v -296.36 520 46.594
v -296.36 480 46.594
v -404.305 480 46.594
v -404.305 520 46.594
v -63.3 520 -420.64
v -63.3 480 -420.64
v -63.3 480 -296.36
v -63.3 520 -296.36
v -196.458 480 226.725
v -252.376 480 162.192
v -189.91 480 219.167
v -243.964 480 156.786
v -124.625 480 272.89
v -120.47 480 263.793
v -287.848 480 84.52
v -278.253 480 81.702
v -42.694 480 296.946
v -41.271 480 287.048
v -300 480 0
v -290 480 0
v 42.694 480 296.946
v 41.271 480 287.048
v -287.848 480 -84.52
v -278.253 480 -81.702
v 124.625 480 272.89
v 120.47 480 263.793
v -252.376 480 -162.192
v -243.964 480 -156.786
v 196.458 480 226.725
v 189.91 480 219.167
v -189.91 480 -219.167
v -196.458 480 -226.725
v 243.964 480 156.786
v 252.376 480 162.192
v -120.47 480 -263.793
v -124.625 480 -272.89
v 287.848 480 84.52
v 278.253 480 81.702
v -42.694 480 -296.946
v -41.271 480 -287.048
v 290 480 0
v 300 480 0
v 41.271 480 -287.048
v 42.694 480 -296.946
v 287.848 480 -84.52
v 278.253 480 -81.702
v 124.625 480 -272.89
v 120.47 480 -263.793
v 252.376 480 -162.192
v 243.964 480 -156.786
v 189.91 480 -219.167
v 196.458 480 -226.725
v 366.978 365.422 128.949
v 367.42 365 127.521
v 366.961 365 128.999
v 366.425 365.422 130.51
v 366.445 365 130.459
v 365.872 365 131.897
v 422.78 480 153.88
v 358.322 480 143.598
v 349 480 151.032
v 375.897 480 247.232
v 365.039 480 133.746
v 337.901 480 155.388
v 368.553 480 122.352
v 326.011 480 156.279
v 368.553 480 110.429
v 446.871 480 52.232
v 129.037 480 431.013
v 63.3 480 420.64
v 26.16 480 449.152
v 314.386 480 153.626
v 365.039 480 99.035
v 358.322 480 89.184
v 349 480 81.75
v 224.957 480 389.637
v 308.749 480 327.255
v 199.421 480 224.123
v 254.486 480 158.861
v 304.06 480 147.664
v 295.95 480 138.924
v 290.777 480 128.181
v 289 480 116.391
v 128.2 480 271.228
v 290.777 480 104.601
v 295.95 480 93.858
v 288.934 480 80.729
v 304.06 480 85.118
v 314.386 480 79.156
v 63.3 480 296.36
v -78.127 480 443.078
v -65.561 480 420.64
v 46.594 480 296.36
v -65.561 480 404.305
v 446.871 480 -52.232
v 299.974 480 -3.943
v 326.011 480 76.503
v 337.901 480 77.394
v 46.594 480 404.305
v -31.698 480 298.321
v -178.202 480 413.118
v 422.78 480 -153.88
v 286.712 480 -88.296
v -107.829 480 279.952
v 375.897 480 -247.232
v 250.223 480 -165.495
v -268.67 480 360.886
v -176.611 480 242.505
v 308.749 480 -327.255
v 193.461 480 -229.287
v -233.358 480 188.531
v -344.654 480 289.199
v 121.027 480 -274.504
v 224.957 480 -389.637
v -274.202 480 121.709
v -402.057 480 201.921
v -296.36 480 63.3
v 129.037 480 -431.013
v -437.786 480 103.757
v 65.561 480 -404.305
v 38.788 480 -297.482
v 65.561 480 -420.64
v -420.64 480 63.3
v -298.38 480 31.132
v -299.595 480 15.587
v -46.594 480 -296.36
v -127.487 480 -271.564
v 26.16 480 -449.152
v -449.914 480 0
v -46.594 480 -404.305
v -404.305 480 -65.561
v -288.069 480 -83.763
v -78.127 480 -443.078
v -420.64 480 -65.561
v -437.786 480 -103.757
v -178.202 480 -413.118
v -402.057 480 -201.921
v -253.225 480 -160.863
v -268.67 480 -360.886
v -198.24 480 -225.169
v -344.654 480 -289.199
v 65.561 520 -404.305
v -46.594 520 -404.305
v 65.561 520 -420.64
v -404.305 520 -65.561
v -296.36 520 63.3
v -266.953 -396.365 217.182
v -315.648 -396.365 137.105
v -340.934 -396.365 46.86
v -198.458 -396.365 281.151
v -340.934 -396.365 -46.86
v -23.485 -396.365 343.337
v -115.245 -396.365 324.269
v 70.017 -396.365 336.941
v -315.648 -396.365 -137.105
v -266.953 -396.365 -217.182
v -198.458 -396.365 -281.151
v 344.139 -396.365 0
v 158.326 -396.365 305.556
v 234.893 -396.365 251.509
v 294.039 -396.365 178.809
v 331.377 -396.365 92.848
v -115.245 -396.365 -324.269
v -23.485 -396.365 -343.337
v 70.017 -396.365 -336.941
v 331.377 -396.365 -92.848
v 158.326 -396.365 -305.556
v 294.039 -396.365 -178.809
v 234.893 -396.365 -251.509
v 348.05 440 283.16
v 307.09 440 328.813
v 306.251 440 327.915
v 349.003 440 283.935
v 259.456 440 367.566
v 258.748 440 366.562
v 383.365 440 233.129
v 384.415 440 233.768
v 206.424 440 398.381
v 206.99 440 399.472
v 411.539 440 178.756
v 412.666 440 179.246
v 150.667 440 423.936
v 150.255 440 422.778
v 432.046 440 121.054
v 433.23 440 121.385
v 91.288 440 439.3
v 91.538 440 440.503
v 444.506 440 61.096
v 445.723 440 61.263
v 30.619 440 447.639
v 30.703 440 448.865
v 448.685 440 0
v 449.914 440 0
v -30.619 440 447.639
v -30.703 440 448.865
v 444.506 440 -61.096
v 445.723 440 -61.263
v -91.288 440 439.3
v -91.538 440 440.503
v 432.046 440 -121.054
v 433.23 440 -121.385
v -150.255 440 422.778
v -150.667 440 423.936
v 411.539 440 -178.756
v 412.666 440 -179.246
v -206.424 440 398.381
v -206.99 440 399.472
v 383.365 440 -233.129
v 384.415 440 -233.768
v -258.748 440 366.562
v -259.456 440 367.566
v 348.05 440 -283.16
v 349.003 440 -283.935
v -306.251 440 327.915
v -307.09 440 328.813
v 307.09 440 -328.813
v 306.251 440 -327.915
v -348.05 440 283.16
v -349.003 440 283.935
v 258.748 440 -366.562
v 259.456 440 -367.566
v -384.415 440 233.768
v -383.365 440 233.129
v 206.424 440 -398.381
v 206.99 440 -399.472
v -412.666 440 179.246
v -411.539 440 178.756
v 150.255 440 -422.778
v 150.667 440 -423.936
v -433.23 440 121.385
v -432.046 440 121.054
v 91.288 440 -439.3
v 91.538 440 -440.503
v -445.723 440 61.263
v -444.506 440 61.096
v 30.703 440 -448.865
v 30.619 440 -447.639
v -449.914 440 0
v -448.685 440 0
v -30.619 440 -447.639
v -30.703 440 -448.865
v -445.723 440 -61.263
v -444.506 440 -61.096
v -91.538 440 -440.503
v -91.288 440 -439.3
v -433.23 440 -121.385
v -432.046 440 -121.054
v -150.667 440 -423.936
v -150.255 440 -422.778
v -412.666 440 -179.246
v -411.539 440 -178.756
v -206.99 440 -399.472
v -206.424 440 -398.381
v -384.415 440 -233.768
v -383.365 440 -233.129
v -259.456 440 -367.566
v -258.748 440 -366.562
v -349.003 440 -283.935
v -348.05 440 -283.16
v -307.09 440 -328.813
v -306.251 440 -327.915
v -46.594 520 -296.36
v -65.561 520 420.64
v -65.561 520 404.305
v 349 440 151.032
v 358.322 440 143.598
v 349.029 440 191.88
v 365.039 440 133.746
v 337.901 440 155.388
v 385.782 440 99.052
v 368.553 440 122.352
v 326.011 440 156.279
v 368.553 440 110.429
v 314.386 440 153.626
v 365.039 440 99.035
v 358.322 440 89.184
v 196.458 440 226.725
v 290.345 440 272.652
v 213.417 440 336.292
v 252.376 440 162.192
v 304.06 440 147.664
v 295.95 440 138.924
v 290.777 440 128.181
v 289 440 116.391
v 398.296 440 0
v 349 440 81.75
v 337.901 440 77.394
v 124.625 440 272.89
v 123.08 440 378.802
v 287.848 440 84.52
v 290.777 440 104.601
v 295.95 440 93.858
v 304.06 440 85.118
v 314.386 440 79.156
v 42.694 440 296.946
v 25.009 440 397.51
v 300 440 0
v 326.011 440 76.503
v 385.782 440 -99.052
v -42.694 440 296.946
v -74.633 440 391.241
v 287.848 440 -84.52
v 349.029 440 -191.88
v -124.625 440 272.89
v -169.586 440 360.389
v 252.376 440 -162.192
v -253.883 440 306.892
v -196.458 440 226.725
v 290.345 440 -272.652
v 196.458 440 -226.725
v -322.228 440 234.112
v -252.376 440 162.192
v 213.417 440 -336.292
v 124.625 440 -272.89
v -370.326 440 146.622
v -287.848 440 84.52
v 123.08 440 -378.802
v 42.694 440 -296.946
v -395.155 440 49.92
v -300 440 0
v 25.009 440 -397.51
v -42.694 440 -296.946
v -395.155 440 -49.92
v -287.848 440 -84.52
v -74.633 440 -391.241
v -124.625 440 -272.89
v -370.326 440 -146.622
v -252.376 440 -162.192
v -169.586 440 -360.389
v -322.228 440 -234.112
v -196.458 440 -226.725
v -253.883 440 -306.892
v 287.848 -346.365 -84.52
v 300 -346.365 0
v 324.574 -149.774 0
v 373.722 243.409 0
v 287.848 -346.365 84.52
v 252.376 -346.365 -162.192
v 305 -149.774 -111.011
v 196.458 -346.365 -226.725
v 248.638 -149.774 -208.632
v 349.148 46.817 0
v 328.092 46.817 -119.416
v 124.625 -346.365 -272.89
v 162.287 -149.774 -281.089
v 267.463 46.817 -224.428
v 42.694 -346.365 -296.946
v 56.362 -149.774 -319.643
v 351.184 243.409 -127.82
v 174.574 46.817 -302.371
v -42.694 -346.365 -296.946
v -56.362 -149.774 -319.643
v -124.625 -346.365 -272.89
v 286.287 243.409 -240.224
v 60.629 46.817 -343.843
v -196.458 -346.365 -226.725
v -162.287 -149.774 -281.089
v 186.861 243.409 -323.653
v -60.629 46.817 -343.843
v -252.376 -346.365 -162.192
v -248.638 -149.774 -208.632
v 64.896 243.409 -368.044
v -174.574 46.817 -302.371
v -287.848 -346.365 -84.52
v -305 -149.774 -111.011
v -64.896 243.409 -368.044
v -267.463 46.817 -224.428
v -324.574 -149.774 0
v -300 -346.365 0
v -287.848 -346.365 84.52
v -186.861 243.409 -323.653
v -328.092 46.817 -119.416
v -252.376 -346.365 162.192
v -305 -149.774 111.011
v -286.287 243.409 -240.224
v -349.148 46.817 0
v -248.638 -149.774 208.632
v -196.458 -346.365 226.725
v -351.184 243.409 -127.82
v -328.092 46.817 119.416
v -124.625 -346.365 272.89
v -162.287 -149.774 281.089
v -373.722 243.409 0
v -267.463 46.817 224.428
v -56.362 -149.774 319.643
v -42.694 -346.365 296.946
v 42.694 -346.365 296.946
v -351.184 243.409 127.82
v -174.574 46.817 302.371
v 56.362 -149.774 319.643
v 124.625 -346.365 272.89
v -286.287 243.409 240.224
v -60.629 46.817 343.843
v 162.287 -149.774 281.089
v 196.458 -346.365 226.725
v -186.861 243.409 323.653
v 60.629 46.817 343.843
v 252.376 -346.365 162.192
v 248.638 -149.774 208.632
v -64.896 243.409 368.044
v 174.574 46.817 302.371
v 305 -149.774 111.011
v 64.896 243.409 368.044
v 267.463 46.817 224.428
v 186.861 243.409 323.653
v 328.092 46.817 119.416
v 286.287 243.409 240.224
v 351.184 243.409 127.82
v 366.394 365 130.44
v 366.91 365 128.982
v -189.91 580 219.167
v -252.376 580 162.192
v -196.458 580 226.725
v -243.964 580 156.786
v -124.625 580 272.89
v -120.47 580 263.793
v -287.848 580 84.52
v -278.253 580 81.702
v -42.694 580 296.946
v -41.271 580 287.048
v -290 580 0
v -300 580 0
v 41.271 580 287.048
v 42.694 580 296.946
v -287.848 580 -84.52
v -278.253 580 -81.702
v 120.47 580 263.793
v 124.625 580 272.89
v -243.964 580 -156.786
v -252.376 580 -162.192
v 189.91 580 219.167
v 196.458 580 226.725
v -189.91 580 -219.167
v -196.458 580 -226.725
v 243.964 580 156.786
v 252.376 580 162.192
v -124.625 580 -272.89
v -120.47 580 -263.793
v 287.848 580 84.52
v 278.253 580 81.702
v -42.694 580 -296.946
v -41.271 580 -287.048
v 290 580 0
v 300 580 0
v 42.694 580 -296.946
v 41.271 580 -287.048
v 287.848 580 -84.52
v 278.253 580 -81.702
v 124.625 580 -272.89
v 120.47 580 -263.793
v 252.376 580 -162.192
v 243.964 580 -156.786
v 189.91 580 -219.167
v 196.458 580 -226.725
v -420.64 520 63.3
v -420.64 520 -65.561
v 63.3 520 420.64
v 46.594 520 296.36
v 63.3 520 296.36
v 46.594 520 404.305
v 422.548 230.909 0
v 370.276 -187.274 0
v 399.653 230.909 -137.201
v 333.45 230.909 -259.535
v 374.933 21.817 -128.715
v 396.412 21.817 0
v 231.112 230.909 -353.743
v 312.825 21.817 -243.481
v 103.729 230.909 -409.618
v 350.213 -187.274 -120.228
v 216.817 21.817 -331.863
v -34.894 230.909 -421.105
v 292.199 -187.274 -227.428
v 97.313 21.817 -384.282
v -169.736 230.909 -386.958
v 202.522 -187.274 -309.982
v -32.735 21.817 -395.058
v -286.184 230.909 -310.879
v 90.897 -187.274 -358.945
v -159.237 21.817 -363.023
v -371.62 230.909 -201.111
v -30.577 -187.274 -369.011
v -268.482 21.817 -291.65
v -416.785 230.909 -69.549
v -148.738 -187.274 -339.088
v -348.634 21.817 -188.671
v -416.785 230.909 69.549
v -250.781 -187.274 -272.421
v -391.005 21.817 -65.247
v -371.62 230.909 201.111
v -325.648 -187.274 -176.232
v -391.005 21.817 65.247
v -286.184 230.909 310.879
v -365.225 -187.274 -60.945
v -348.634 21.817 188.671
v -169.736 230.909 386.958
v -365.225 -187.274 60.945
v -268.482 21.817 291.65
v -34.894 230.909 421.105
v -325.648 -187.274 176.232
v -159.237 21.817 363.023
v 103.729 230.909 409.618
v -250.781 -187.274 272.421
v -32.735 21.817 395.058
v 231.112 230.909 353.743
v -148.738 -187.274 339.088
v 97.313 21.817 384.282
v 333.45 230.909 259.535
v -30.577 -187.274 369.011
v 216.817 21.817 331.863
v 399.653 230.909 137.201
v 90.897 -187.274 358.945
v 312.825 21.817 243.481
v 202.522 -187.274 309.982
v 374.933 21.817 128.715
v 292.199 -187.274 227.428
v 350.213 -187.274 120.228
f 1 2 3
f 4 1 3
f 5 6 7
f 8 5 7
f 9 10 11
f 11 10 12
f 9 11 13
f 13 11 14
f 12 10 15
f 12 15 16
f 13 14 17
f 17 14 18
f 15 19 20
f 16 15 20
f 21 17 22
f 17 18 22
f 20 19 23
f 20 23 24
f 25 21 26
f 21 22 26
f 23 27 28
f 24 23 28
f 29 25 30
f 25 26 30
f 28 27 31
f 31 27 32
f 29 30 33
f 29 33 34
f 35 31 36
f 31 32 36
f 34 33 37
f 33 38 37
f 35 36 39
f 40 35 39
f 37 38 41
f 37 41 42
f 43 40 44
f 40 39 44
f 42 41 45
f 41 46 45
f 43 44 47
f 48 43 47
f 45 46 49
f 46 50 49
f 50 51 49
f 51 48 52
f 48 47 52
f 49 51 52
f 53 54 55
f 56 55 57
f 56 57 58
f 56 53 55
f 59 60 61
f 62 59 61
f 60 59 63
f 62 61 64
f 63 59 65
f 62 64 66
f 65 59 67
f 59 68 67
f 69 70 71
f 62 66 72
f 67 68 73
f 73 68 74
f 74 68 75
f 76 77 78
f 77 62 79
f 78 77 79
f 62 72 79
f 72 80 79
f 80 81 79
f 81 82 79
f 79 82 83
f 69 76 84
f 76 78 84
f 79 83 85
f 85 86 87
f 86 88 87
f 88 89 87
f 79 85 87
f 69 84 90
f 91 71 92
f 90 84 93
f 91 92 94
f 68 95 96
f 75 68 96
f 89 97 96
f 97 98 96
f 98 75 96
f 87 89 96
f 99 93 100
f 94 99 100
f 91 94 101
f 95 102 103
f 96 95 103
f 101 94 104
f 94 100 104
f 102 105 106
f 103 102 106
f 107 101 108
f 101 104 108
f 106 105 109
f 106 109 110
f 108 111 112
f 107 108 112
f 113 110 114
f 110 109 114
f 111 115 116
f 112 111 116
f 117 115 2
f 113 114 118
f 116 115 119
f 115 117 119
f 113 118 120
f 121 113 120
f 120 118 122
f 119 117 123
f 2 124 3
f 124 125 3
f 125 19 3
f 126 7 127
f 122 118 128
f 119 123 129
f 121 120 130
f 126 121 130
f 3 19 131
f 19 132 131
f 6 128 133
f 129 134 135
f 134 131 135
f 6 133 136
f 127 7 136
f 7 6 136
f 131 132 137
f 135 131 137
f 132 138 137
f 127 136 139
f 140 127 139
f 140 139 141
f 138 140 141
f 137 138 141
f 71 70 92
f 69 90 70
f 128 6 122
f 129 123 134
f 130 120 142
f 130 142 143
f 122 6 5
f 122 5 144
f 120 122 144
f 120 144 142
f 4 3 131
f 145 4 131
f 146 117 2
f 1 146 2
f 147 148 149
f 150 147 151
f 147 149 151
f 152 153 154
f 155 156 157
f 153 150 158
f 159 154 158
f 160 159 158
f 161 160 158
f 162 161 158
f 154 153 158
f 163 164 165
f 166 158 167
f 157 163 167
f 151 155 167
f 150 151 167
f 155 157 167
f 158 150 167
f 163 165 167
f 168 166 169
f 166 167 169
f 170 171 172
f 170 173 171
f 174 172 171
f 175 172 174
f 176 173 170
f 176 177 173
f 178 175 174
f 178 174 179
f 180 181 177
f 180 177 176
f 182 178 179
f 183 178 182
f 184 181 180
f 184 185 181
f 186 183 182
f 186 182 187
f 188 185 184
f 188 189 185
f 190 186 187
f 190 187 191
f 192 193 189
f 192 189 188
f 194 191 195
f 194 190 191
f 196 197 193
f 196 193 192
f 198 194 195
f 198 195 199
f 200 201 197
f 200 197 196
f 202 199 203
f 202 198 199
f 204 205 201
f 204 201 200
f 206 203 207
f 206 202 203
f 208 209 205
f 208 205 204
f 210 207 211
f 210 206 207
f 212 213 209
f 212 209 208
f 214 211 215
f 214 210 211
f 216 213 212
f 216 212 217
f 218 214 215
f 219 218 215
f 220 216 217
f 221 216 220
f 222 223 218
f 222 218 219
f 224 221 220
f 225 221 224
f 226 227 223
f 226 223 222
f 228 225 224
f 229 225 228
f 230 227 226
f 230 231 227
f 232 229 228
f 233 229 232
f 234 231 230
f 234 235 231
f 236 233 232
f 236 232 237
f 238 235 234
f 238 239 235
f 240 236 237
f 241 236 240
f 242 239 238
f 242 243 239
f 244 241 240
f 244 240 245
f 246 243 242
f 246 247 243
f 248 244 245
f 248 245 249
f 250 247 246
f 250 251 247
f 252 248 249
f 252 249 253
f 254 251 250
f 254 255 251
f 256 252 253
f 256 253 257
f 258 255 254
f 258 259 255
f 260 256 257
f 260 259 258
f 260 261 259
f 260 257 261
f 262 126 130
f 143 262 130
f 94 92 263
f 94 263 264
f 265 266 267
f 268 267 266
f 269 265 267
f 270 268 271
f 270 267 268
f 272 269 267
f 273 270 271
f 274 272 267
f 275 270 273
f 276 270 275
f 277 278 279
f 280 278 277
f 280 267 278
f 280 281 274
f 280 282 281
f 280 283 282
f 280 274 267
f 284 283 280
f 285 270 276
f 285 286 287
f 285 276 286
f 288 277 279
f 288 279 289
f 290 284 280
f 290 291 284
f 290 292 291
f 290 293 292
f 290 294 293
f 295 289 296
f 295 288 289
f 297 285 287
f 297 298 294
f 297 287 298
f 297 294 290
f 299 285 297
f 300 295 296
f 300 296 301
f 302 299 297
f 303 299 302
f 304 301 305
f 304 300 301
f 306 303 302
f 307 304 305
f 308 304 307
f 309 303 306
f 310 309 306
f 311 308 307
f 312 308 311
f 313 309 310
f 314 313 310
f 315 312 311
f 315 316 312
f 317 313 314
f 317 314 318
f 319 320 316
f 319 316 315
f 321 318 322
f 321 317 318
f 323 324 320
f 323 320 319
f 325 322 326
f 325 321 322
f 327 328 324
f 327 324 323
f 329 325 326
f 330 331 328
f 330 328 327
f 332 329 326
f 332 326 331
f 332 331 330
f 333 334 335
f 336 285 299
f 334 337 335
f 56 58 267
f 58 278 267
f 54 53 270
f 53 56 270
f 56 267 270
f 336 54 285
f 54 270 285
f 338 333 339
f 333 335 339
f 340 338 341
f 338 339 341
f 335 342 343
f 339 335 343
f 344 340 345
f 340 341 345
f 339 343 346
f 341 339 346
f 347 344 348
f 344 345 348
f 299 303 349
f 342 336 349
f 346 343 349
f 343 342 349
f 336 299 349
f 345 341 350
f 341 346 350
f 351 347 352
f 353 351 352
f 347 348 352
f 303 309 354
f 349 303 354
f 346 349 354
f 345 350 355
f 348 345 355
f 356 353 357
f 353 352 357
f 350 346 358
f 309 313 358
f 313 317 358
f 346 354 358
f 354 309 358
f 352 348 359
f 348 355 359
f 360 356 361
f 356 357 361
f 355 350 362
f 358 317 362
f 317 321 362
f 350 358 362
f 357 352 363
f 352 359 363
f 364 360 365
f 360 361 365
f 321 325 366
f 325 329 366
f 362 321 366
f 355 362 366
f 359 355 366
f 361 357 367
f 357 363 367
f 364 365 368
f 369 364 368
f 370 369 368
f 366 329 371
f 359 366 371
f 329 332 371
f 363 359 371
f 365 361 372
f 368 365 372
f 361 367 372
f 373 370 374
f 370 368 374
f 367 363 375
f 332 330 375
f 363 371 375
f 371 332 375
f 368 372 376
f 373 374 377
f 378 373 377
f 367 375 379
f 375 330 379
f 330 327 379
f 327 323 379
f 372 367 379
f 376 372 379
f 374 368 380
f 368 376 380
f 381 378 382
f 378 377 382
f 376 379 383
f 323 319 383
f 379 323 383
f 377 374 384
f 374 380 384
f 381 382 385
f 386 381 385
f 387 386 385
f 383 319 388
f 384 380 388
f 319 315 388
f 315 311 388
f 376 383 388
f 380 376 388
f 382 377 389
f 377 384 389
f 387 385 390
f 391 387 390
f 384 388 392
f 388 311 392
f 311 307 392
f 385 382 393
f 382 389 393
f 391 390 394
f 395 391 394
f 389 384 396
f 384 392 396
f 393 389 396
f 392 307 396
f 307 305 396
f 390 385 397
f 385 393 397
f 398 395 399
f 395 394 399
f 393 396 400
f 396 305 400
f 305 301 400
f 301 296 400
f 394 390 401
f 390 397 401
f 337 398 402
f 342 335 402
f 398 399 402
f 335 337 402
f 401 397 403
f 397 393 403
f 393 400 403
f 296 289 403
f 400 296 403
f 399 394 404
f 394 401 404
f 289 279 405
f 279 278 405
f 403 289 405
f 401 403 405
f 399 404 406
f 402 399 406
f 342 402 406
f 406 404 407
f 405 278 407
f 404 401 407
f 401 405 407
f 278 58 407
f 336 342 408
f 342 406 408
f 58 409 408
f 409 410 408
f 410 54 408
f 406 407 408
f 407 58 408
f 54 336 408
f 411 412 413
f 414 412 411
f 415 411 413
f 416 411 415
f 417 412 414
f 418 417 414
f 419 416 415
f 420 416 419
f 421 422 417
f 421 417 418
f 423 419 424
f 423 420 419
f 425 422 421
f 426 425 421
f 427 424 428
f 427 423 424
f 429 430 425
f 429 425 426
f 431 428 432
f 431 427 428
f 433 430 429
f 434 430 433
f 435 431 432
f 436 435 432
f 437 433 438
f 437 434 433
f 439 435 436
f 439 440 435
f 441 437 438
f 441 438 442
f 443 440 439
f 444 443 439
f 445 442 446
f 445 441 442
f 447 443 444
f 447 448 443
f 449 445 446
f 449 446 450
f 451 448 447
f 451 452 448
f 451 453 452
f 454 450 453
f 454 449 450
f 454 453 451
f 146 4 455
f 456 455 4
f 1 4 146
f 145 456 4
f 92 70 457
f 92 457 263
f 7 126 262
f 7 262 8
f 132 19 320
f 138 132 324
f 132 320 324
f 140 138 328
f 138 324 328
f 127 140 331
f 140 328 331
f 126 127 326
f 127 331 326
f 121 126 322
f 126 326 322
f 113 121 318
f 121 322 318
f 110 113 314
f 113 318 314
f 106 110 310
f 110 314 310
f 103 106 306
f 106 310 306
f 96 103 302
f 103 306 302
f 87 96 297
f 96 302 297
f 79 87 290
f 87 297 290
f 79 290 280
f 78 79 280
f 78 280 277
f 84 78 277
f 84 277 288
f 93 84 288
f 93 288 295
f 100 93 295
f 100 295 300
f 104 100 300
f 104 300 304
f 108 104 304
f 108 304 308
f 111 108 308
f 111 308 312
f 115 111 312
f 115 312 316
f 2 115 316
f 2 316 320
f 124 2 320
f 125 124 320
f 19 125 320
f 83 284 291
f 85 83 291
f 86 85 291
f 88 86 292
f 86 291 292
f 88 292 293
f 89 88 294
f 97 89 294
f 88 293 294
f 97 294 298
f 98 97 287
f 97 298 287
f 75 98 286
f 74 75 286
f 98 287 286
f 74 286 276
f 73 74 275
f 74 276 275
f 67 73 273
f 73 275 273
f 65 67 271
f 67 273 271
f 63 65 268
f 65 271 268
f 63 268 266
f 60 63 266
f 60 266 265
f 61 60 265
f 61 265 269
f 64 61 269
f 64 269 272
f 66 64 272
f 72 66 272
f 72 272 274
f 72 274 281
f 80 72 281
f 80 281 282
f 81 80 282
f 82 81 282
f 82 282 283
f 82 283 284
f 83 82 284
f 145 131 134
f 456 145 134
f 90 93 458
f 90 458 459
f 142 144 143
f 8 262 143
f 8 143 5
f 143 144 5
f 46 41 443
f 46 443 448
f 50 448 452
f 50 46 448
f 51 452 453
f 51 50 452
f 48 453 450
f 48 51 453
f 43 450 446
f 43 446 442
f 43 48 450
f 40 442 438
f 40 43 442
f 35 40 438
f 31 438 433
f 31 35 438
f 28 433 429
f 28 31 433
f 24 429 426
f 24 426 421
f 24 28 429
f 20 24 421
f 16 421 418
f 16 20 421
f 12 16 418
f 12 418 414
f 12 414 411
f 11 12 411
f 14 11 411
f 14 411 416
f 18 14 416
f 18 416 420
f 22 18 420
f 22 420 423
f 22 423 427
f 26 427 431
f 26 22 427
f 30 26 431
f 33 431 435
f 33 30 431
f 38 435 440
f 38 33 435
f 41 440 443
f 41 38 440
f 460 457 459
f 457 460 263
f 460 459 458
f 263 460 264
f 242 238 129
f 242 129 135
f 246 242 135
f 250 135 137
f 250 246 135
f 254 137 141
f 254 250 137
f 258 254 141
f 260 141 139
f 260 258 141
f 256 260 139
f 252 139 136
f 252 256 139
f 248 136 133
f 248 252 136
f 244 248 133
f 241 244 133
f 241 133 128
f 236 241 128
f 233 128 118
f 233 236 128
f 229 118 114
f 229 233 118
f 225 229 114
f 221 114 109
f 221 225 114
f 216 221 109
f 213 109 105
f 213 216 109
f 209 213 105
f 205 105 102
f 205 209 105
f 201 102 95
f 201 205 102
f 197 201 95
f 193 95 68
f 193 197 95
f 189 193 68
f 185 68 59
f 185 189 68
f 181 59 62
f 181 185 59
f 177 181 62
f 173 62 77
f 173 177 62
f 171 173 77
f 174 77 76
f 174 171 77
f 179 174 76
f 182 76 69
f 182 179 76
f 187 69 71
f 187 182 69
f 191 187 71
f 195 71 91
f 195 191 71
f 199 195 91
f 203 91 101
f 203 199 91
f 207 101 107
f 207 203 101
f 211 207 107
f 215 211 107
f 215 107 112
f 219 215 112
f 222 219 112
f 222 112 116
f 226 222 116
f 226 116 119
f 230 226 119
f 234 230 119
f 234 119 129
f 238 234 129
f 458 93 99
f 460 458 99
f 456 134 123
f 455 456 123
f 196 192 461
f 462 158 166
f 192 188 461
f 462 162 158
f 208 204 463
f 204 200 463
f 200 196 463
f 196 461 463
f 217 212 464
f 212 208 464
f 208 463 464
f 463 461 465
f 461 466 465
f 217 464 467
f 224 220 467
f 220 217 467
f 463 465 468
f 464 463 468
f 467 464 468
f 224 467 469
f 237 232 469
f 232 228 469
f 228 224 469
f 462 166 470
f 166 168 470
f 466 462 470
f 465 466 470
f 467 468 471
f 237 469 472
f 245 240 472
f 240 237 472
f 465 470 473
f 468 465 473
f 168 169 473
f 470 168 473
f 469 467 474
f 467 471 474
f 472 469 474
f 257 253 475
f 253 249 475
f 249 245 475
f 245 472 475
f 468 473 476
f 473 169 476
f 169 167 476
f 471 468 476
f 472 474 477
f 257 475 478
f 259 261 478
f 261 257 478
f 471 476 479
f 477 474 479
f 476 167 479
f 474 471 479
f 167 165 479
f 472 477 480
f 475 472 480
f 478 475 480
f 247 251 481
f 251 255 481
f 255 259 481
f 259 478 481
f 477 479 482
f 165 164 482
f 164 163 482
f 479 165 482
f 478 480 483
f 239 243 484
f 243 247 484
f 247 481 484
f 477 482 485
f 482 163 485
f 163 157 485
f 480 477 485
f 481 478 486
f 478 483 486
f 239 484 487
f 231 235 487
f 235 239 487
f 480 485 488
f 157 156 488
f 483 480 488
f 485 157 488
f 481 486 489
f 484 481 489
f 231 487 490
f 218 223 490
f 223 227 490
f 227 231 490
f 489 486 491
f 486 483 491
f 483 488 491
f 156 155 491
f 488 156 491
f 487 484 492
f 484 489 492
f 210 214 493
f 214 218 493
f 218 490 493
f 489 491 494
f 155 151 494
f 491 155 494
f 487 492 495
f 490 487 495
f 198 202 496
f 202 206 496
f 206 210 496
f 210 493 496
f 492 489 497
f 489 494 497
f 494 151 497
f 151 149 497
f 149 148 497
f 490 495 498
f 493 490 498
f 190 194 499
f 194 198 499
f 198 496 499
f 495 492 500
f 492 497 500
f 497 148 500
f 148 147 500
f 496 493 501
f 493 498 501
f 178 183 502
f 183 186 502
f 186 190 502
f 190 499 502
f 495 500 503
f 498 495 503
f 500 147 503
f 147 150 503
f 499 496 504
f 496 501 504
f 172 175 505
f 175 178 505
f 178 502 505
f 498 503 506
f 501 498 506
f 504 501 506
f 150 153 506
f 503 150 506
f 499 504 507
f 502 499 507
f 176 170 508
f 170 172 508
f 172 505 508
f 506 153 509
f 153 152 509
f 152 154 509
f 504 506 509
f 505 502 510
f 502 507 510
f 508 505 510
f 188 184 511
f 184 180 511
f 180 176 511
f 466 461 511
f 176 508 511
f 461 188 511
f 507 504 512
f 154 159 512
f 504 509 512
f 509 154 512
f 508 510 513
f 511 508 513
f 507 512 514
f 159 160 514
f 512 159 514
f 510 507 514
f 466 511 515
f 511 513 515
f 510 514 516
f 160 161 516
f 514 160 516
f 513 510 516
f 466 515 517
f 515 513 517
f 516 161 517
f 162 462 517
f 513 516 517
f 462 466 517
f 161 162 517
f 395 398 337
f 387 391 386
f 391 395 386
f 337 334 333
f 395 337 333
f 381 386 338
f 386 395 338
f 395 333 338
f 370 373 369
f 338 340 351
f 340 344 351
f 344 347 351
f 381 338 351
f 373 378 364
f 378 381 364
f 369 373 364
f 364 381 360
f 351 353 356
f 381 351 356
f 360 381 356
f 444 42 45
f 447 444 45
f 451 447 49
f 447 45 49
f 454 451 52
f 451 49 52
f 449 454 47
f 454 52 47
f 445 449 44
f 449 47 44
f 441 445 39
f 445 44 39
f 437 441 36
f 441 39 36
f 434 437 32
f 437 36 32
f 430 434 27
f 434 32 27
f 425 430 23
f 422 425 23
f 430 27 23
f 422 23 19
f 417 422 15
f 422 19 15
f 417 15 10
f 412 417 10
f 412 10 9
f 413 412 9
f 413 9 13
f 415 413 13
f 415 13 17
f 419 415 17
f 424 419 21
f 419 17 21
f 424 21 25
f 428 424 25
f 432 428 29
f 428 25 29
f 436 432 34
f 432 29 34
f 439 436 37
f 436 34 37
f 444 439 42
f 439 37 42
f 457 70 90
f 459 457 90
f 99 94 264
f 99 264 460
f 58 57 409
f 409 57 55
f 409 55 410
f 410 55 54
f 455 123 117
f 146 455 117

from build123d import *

# Parameters (mm, degrees)
SKETCH8_R               = 449.913599191
SKETCH8_R_2             = 300
BOSS_EXTRUDE5_DEPTH     = 40
SKETCH9_R               = 300
SKETCH9_R_2             = 290
BOSS_EXTRUDE6_DEPTH     = 100
SKETCH11_R              = 40
CUT_EXTRUDE2_DEPTH      = 75
CUT_EXTRUDE2_DEPTH_BACK = 109
BOSS_EXTRUDE13_DEPTH    = 40


with BuildPart() as part:
    # Sketch2 → Revolve2 (revolve)
    with BuildSketch(Plane.XY):
        Polygon((300, -346.365021048), (400.000001225, 453.634978952), (449.613895127, 447.433242138), (344.139110927, -396.365021124), (0, -396.365021124), (0, -346.365021048), align=None)
    revolve(axis=Axis((0, -396.365021124, 0), (0, 1, 0)))

    # Sketch8 → Boss-Extrude5 (add)
    with BuildSketch(Plane(origin=(0, 440, 0), x_dir=(-1, 0, 0), z_dir=(0, -1, 0))):
        Circle(SKETCH8_R)
        Circle(SKETCH8_R_2, mode=Mode.SUBTRACT)
    extrude(amount=-BOSS_EXTRUDE5_DEPTH)

    # Sketch11 → Cut-Extrude2 (cut, two sides)
    with BuildSketch(Plane(origin=(0, 440, 0), x_dir=(-1, 0, 0), z_dir=(0, -1, 0))) as cut_extrude2_sk:
        with Locations((-329, -116.390796004)):
            Circle(SKETCH11_R)
    extrude(amount=CUT_EXTRUDE2_DEPTH, mode=Mode.SUBTRACT)
    extrude(cut_extrude2_sk.sketch, amount=-CUT_EXTRUDE2_DEPTH_BACK, mode=Mode.SUBTRACT)

    # Sketch12 → Boss-Extrude13 (add)
    with BuildSketch(Plane(origin=(0, 480, 0), x_dir=(1, 0, 0), z_dir=(0, 1, 0))):
        Polygon((-420.640420646, 65.560892628), (-420.640420646, -63.300257476), (-404.30487033, -63.300257476), (-300, -63.300257476), (-296.359650017, -63.300257476), (-296.359650017, -46.593538627), (-300, -46.593538627), (-404.30487033, -46.593538627), (-404.30487033, 65.560892628), align=None)
        Polygon((65.560892628, 420.640420646), (65.560892628, 404.30487033), (-46.593538627, 404.30487033), (-46.593538627, 300), (-46.593538627, 296.359650017), (-63.300257476, 296.359650017), (-63.300257476, 300), (-63.300257476, 404.30487033), (-63.300257476, 420.640420646), align=None)
        Polygon((46.593538627, -300), (46.593538627, -296.359650017), (63.300257476, -296.359650017), (63.300257476, -300), (63.300257476, -404.30487033), (63.300257476, -420.640420646), (-65.560892628, -420.640420646), (-65.560892628, -404.30487033), (46.593538627, -404.30487033), align=None)
    extrude(amount=BOSS_EXTRUDE13_DEPTH)


with BuildPart() as body_2:
    # Sketch9 → Boss-Extrude6 (new body)
    with BuildSketch(Plane(origin=(0, 480, 0), x_dir=(1, 0, 0), z_dir=(0, 1, 0))):
        Circle(SKETCH9_R)
        Circle(SKETCH9_R_2, mode=Mode.SUBTRACT)
    extrude(amount=BOSS_EXTRUDE6_DEPTH)


solid = Compound([part.part, body_2.part])
